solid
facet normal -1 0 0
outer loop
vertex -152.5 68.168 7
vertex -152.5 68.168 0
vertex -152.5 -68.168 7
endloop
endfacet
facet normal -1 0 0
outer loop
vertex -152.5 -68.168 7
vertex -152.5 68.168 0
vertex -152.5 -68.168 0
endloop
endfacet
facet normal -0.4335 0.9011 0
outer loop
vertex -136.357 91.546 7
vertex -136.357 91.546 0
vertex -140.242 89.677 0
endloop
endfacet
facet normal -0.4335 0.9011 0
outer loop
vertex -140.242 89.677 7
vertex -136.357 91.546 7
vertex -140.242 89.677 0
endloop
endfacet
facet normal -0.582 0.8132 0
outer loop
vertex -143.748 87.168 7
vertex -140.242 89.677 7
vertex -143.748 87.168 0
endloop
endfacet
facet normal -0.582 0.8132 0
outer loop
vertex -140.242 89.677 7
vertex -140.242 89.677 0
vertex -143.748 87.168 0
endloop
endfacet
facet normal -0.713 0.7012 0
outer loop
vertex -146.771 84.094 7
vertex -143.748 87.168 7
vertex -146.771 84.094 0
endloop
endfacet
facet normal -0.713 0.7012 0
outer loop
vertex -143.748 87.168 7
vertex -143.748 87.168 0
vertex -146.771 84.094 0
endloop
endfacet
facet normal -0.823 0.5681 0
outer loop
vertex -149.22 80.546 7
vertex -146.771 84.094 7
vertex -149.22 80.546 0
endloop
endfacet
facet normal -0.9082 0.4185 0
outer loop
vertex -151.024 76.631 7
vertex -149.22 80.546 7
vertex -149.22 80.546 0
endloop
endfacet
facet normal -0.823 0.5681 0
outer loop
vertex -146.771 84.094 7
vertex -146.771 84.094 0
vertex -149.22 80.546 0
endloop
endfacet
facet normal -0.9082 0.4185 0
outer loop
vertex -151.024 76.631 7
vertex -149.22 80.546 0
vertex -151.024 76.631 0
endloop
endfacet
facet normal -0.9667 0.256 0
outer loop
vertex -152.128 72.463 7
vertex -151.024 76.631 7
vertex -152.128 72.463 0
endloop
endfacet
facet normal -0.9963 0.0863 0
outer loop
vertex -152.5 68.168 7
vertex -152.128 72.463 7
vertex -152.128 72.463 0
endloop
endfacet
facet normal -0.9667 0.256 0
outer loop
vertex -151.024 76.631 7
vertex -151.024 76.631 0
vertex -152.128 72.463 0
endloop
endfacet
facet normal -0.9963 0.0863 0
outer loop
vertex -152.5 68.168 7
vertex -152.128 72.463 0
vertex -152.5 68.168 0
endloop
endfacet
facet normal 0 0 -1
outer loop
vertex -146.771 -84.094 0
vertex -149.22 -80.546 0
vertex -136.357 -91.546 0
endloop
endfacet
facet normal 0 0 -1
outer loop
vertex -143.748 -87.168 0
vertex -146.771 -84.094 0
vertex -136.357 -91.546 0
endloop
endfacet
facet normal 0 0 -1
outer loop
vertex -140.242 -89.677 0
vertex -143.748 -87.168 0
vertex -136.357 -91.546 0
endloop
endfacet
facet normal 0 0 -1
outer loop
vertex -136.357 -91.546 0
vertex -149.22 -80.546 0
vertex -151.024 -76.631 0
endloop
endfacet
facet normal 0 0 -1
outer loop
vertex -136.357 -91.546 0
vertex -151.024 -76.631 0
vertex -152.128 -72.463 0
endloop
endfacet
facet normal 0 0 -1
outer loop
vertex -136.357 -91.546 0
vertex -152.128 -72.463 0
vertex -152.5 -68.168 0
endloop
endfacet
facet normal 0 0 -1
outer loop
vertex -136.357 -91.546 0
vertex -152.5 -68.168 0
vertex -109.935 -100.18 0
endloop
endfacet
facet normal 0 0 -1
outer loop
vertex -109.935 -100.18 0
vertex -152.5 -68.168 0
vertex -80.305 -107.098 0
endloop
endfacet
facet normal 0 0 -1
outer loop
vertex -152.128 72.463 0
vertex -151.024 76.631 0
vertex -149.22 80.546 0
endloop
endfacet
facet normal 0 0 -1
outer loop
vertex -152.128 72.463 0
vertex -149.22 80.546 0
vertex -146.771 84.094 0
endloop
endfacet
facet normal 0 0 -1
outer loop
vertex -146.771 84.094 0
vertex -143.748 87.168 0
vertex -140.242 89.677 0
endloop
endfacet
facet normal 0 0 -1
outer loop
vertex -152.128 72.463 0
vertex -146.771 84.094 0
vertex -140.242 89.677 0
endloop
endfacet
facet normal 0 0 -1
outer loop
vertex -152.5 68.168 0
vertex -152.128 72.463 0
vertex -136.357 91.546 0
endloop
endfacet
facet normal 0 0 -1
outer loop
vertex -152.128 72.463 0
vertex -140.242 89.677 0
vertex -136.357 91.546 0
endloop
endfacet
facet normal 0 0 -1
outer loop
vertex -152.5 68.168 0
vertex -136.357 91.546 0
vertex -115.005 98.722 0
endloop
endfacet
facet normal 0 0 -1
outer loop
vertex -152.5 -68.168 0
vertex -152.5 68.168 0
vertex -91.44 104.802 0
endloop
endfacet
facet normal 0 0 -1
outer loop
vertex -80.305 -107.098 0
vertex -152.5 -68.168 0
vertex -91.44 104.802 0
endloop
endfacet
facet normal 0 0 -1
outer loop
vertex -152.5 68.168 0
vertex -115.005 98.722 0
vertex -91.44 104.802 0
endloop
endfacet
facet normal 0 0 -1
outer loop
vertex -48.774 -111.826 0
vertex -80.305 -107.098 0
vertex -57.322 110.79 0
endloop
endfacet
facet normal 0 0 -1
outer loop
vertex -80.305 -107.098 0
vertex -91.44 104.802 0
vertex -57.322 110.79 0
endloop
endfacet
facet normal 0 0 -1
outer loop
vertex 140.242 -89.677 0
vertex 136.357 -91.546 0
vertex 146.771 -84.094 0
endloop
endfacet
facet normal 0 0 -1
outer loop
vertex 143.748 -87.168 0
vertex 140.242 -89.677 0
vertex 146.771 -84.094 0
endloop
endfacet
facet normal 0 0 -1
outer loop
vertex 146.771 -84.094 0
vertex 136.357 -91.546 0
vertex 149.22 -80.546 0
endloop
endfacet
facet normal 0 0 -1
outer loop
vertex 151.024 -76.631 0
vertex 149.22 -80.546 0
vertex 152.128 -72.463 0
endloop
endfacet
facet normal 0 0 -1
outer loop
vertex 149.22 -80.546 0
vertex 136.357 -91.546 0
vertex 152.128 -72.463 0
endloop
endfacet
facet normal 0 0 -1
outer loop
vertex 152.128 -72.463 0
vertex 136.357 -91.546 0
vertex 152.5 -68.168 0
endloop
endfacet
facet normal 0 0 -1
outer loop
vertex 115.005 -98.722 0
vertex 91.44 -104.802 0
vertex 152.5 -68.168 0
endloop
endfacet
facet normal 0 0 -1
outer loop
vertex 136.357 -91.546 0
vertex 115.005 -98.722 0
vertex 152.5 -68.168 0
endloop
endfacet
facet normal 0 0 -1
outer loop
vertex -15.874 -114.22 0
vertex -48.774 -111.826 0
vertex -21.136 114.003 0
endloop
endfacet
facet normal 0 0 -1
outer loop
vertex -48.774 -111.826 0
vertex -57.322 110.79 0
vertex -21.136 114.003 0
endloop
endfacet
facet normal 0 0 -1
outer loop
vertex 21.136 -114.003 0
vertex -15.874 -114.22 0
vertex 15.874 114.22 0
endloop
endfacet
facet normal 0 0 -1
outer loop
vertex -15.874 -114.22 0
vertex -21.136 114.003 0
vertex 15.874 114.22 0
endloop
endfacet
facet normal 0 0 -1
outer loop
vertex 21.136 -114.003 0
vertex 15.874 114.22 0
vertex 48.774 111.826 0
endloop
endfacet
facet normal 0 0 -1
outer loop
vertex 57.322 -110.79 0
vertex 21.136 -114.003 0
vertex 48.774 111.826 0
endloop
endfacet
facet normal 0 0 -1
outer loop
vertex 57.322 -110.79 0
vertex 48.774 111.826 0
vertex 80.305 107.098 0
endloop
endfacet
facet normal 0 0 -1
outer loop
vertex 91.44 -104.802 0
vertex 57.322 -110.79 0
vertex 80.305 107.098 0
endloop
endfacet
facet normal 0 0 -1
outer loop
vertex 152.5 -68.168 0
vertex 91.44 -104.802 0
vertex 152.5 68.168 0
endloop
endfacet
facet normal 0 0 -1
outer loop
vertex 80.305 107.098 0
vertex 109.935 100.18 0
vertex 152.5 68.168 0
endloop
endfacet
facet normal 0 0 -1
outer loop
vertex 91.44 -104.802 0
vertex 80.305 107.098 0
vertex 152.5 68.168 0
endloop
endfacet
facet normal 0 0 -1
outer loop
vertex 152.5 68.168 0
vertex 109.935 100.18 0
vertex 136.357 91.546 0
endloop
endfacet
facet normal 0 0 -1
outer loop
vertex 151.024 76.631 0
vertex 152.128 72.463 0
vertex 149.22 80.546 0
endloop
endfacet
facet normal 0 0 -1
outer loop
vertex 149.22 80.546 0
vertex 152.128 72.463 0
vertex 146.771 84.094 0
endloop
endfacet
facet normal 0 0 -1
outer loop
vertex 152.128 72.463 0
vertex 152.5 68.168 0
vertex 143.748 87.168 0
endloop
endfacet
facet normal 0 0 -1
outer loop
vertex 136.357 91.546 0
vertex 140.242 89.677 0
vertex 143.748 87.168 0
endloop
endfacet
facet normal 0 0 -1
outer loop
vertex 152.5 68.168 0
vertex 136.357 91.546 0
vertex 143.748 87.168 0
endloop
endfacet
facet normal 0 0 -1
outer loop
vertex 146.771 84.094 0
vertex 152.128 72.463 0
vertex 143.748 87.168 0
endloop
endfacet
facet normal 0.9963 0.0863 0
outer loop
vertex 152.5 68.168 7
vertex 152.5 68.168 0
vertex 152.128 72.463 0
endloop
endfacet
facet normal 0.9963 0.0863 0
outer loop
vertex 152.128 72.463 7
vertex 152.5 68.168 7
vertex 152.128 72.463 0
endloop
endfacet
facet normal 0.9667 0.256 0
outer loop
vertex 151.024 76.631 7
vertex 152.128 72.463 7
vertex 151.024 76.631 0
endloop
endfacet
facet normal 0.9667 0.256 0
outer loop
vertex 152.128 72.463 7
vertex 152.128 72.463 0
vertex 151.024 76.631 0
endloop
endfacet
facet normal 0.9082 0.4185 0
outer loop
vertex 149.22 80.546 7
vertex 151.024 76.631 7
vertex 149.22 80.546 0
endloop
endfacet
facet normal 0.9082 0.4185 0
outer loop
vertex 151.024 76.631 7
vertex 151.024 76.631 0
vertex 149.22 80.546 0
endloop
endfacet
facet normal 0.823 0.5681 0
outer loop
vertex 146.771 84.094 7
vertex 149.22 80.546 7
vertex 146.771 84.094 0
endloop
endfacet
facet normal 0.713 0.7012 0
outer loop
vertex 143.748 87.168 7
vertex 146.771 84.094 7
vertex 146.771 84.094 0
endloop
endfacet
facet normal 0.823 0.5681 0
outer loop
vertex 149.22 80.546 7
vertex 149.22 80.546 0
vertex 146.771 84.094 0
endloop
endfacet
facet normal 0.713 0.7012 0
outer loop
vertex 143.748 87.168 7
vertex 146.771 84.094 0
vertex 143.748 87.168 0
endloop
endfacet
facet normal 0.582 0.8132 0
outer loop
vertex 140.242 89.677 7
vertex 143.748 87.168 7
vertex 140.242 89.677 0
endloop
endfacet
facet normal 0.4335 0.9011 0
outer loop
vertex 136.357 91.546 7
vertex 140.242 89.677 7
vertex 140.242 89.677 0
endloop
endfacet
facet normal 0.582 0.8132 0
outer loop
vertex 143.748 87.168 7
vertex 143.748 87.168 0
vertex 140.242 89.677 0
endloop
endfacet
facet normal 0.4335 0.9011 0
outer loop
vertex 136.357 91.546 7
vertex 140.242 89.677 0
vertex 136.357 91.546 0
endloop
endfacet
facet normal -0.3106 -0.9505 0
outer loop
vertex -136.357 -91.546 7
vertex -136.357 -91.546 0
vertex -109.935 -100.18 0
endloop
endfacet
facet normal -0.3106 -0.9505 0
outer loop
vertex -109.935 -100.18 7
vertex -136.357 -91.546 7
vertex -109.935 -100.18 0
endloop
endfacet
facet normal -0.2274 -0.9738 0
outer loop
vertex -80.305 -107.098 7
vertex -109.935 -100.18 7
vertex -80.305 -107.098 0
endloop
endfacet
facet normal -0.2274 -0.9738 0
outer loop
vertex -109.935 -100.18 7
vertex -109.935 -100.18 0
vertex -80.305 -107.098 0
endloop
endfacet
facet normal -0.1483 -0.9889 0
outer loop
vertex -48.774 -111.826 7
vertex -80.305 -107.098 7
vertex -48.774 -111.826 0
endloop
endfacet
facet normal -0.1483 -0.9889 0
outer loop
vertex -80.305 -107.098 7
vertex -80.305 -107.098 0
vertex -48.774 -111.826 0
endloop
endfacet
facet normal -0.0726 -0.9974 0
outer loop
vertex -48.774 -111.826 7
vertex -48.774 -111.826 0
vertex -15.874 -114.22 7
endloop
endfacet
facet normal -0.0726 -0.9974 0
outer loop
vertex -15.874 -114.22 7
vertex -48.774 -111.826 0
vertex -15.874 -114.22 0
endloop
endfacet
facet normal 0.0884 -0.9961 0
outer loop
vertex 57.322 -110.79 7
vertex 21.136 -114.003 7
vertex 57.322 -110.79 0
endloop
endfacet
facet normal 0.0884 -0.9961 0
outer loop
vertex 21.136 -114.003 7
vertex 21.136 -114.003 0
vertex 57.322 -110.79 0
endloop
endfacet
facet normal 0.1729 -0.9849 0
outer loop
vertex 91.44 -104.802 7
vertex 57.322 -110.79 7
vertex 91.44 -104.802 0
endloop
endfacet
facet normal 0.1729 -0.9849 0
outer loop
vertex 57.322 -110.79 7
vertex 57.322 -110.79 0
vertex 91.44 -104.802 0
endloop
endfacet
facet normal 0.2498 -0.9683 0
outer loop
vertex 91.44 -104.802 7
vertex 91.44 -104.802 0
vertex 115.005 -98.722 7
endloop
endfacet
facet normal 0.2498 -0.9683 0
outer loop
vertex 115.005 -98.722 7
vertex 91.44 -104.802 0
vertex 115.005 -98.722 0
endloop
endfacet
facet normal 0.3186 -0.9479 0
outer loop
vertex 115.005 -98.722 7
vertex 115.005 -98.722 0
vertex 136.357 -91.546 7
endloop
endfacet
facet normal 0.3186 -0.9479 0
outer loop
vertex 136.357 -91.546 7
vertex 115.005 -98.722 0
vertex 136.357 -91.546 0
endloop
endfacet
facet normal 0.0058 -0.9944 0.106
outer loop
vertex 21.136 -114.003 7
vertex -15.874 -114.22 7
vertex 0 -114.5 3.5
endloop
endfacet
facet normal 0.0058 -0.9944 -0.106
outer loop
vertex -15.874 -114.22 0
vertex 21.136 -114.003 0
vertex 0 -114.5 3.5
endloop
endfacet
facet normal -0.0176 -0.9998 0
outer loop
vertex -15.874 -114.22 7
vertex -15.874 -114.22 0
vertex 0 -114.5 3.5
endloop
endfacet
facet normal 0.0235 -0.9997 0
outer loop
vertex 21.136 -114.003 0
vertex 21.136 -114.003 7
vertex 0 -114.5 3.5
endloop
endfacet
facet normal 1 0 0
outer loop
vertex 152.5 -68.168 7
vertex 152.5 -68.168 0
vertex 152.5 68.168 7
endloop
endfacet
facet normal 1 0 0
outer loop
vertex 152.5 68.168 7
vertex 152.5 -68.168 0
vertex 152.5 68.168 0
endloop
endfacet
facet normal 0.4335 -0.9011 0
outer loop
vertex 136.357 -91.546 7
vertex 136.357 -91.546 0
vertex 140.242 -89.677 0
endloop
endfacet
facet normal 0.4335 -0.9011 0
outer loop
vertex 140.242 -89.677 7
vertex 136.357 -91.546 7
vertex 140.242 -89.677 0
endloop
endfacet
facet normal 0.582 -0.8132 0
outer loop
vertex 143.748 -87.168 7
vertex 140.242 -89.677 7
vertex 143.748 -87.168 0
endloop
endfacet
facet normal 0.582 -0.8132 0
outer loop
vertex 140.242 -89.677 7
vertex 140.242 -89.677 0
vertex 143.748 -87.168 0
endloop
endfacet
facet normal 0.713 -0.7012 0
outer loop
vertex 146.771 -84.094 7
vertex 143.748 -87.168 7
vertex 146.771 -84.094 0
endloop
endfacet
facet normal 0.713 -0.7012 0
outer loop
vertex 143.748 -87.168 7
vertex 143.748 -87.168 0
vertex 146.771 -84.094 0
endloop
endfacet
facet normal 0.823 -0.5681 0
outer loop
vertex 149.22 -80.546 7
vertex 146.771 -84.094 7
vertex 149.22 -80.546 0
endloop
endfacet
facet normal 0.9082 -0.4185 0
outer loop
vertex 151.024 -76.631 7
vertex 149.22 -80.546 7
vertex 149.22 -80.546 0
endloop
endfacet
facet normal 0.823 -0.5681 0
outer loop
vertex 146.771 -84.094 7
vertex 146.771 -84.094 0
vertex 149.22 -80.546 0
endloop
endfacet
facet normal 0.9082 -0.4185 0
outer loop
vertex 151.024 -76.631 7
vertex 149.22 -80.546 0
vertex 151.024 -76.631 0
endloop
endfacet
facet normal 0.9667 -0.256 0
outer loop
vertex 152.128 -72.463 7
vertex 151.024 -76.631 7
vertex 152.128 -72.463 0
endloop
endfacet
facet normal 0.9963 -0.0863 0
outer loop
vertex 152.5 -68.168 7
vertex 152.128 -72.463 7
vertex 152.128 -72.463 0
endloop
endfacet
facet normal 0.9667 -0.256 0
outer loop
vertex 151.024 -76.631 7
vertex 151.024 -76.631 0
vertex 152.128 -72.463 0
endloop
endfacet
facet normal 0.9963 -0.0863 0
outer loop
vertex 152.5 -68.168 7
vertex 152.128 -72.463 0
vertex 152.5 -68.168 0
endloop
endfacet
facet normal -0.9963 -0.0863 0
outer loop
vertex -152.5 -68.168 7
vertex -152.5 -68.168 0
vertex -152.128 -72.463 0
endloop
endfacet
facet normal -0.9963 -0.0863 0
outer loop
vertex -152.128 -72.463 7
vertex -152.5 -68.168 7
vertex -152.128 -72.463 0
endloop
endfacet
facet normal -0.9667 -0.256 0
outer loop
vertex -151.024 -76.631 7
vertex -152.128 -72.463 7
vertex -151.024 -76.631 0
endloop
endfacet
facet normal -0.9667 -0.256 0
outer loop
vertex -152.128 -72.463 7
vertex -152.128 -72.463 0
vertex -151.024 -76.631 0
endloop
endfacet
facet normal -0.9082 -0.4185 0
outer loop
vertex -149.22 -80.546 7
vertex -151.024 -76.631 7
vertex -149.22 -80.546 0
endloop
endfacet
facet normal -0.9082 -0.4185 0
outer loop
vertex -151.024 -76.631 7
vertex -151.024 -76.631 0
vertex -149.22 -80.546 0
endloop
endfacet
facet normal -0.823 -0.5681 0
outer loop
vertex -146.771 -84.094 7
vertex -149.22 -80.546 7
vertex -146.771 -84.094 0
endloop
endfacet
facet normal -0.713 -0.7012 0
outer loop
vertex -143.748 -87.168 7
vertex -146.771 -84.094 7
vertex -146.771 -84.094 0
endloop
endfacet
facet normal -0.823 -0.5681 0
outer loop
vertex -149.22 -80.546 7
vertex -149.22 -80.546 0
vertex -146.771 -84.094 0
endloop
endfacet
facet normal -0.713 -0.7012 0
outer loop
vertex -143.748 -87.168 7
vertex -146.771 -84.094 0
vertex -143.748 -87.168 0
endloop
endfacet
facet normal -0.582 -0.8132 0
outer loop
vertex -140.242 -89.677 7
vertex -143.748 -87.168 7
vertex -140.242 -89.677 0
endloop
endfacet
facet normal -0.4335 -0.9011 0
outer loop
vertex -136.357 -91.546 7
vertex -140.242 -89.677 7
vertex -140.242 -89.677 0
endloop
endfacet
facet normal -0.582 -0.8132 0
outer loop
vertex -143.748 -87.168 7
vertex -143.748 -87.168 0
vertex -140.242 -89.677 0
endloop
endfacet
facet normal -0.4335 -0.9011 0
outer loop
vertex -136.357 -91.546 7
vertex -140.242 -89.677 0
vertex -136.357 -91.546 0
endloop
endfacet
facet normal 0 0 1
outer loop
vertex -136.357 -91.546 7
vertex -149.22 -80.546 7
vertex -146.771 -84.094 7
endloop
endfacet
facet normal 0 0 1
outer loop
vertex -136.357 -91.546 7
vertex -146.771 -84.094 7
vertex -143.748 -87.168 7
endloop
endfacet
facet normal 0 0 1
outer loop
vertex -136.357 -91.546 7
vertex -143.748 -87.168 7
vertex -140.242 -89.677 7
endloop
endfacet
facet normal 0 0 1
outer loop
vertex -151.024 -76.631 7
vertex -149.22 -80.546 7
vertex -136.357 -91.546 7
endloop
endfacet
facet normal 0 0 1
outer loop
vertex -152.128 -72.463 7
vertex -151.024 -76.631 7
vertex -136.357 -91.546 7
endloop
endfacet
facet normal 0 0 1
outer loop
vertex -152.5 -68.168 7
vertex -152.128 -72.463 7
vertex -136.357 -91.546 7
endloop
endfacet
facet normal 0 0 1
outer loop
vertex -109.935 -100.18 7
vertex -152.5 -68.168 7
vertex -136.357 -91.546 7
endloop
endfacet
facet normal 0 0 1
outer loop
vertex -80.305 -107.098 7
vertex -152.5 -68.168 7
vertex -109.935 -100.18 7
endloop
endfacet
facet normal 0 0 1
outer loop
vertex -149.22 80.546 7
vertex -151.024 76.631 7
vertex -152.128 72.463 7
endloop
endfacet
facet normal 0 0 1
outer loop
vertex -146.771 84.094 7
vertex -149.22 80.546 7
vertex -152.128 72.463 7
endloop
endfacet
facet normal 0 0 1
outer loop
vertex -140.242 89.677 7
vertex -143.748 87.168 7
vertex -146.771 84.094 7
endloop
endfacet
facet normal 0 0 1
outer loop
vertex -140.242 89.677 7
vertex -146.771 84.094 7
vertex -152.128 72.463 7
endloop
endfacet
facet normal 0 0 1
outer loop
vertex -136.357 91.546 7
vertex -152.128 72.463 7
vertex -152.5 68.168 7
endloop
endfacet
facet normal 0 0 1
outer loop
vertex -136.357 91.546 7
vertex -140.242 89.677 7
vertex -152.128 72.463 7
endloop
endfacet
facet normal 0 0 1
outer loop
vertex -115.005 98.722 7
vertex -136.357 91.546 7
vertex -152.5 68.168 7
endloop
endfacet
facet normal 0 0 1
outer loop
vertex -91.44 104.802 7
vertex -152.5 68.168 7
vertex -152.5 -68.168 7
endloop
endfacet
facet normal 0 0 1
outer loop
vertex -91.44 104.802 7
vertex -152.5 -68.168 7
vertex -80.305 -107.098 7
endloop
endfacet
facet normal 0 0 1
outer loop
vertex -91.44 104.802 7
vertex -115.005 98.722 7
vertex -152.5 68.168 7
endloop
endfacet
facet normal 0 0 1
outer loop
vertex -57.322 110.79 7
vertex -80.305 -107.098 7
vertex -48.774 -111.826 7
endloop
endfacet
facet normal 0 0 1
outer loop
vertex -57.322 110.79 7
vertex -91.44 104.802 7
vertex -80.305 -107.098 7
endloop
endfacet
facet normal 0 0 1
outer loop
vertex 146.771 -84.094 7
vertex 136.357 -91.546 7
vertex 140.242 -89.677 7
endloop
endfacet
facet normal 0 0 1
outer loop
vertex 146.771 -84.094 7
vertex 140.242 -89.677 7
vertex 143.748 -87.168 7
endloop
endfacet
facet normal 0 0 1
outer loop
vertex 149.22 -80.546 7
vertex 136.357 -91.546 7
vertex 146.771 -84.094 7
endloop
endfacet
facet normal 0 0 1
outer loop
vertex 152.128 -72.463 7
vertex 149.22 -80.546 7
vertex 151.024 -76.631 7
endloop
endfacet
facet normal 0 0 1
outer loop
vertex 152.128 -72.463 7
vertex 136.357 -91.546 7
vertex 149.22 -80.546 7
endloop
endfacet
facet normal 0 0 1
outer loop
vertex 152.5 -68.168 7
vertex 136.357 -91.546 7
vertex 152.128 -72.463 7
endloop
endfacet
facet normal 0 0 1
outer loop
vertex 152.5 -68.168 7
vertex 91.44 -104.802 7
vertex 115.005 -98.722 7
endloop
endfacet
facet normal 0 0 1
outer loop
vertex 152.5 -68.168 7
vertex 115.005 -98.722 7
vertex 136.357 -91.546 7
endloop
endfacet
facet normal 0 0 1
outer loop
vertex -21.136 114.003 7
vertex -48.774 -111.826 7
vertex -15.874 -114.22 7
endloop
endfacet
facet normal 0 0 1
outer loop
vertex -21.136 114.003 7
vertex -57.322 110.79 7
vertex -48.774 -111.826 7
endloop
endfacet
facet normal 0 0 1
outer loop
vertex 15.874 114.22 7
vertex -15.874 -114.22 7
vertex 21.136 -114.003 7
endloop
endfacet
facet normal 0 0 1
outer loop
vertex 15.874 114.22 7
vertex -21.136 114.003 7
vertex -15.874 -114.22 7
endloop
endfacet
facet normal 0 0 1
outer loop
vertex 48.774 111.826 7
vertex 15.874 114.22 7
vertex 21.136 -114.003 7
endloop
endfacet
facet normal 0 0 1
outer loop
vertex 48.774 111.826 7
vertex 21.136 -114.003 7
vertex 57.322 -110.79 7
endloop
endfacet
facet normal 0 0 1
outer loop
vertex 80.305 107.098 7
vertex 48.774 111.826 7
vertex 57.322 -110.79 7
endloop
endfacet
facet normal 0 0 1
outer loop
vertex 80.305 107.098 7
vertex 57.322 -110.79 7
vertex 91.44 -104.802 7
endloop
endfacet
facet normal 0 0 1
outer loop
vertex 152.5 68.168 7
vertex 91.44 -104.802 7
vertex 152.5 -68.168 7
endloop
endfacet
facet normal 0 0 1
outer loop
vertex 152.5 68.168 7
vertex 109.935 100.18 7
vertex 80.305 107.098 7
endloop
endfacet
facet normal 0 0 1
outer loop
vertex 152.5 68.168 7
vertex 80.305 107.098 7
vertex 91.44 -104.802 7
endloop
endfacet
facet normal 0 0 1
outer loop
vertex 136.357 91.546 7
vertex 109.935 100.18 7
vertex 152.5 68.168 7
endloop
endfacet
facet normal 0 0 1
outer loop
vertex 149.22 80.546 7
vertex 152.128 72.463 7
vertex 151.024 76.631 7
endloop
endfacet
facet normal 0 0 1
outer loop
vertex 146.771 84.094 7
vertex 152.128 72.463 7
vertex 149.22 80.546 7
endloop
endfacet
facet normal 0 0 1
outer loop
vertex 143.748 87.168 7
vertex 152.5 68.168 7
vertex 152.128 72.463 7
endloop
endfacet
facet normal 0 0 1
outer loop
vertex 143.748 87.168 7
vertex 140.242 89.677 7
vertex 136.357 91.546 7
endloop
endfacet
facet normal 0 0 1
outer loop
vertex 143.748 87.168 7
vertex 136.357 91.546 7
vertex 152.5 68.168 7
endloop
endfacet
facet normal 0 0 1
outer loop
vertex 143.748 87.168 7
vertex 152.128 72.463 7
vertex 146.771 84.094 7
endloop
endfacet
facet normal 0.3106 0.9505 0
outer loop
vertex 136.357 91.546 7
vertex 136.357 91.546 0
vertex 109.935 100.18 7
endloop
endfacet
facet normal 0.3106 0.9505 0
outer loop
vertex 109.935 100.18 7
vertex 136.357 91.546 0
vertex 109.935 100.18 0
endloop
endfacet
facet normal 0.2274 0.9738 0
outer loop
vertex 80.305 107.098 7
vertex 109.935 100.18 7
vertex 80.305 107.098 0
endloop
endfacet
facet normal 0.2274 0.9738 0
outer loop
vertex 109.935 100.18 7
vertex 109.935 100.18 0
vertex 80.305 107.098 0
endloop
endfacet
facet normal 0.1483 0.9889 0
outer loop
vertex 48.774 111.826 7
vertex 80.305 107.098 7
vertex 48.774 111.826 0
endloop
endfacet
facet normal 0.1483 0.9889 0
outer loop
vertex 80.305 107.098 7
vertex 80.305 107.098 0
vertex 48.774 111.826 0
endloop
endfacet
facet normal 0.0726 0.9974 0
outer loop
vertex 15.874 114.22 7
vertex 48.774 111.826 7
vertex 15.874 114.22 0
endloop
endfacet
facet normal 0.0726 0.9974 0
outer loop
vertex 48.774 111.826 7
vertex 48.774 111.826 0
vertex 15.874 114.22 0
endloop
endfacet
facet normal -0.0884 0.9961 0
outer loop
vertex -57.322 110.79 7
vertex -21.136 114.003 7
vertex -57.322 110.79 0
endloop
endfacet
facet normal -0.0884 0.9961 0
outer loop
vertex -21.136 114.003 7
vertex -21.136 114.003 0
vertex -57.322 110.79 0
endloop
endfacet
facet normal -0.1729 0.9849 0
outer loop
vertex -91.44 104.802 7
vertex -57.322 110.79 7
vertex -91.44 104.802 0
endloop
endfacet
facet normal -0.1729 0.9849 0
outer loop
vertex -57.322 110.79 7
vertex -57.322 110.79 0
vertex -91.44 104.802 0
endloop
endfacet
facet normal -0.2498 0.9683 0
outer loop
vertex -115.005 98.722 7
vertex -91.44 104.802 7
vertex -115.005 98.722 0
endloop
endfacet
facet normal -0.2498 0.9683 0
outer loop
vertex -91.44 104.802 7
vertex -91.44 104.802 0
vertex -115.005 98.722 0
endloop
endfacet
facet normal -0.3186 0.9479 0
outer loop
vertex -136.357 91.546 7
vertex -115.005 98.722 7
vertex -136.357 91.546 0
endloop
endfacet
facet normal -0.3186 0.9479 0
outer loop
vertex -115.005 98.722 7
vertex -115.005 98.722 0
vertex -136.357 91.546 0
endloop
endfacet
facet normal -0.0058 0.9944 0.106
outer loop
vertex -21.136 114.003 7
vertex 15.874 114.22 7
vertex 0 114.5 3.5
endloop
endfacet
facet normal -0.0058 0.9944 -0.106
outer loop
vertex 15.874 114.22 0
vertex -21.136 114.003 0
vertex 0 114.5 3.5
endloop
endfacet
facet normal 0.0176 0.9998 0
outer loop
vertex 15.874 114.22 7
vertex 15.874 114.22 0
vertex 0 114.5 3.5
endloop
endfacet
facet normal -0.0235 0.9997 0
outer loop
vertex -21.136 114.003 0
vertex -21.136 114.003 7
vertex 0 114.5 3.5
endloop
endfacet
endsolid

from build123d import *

# Parameters (mm, degrees)
F1_DEPTH = 7


with BuildPart() as f1:
    # F0 (on Top) → F1 (new body)
    with BuildSketch(Plane.XY):
        with BuildLine():
            ThreePointArc((136.3574169857, -91.5464991998), (148.072255888, -82.3731816378), (152.5, -68.1681723918))
            Line((152.5, -68.1681723918), (152.5, 68.1681723918))
            ThreePointArc((152.5, 68.1681723918), (148.072255888, 82.3731816378), (136.3574169857, 91.5464991998))
            add(Edge.make_bspline(
                [(136.3574169857, 91.5464991998), (0, 143.2086438541), (-136.3574169857, 91.5464991998)],
                knots=[0.926516862, 0.926516862, 0.926516862, 2.2150757916, 2.2150757916, 2.2150757916], degree=2, weights=[1, 0.7995327441, 1]))
            ThreePointArc((-136.3574169857, 91.5464991998), (-148.072255888, 82.3731816378), (-152.5, 68.1681723918))
            Line((-152.5, 68.1681723918), (-152.5, -68.1681723918))
            ThreePointArc((-152.5, -68.1681723918), (-148.072255888, -82.3731816378), (-136.3574169857, -91.5464991998))
            add(Edge.make_bspline(
                [(-136.357416964, -91.546499208), (1.69e-08, -143.2086438477), (136.3574169857, -91.5464991998)],
                knots=[4.0681095157, 4.0681095157, 4.0681095157, 5.3566684452, 5.3566684452, 5.3566684452], degree=2, weights=[1, 0.7995327441, 1]))
        make_face()
    extrude(amount=F1_DEPTH)


solid = f1.part
